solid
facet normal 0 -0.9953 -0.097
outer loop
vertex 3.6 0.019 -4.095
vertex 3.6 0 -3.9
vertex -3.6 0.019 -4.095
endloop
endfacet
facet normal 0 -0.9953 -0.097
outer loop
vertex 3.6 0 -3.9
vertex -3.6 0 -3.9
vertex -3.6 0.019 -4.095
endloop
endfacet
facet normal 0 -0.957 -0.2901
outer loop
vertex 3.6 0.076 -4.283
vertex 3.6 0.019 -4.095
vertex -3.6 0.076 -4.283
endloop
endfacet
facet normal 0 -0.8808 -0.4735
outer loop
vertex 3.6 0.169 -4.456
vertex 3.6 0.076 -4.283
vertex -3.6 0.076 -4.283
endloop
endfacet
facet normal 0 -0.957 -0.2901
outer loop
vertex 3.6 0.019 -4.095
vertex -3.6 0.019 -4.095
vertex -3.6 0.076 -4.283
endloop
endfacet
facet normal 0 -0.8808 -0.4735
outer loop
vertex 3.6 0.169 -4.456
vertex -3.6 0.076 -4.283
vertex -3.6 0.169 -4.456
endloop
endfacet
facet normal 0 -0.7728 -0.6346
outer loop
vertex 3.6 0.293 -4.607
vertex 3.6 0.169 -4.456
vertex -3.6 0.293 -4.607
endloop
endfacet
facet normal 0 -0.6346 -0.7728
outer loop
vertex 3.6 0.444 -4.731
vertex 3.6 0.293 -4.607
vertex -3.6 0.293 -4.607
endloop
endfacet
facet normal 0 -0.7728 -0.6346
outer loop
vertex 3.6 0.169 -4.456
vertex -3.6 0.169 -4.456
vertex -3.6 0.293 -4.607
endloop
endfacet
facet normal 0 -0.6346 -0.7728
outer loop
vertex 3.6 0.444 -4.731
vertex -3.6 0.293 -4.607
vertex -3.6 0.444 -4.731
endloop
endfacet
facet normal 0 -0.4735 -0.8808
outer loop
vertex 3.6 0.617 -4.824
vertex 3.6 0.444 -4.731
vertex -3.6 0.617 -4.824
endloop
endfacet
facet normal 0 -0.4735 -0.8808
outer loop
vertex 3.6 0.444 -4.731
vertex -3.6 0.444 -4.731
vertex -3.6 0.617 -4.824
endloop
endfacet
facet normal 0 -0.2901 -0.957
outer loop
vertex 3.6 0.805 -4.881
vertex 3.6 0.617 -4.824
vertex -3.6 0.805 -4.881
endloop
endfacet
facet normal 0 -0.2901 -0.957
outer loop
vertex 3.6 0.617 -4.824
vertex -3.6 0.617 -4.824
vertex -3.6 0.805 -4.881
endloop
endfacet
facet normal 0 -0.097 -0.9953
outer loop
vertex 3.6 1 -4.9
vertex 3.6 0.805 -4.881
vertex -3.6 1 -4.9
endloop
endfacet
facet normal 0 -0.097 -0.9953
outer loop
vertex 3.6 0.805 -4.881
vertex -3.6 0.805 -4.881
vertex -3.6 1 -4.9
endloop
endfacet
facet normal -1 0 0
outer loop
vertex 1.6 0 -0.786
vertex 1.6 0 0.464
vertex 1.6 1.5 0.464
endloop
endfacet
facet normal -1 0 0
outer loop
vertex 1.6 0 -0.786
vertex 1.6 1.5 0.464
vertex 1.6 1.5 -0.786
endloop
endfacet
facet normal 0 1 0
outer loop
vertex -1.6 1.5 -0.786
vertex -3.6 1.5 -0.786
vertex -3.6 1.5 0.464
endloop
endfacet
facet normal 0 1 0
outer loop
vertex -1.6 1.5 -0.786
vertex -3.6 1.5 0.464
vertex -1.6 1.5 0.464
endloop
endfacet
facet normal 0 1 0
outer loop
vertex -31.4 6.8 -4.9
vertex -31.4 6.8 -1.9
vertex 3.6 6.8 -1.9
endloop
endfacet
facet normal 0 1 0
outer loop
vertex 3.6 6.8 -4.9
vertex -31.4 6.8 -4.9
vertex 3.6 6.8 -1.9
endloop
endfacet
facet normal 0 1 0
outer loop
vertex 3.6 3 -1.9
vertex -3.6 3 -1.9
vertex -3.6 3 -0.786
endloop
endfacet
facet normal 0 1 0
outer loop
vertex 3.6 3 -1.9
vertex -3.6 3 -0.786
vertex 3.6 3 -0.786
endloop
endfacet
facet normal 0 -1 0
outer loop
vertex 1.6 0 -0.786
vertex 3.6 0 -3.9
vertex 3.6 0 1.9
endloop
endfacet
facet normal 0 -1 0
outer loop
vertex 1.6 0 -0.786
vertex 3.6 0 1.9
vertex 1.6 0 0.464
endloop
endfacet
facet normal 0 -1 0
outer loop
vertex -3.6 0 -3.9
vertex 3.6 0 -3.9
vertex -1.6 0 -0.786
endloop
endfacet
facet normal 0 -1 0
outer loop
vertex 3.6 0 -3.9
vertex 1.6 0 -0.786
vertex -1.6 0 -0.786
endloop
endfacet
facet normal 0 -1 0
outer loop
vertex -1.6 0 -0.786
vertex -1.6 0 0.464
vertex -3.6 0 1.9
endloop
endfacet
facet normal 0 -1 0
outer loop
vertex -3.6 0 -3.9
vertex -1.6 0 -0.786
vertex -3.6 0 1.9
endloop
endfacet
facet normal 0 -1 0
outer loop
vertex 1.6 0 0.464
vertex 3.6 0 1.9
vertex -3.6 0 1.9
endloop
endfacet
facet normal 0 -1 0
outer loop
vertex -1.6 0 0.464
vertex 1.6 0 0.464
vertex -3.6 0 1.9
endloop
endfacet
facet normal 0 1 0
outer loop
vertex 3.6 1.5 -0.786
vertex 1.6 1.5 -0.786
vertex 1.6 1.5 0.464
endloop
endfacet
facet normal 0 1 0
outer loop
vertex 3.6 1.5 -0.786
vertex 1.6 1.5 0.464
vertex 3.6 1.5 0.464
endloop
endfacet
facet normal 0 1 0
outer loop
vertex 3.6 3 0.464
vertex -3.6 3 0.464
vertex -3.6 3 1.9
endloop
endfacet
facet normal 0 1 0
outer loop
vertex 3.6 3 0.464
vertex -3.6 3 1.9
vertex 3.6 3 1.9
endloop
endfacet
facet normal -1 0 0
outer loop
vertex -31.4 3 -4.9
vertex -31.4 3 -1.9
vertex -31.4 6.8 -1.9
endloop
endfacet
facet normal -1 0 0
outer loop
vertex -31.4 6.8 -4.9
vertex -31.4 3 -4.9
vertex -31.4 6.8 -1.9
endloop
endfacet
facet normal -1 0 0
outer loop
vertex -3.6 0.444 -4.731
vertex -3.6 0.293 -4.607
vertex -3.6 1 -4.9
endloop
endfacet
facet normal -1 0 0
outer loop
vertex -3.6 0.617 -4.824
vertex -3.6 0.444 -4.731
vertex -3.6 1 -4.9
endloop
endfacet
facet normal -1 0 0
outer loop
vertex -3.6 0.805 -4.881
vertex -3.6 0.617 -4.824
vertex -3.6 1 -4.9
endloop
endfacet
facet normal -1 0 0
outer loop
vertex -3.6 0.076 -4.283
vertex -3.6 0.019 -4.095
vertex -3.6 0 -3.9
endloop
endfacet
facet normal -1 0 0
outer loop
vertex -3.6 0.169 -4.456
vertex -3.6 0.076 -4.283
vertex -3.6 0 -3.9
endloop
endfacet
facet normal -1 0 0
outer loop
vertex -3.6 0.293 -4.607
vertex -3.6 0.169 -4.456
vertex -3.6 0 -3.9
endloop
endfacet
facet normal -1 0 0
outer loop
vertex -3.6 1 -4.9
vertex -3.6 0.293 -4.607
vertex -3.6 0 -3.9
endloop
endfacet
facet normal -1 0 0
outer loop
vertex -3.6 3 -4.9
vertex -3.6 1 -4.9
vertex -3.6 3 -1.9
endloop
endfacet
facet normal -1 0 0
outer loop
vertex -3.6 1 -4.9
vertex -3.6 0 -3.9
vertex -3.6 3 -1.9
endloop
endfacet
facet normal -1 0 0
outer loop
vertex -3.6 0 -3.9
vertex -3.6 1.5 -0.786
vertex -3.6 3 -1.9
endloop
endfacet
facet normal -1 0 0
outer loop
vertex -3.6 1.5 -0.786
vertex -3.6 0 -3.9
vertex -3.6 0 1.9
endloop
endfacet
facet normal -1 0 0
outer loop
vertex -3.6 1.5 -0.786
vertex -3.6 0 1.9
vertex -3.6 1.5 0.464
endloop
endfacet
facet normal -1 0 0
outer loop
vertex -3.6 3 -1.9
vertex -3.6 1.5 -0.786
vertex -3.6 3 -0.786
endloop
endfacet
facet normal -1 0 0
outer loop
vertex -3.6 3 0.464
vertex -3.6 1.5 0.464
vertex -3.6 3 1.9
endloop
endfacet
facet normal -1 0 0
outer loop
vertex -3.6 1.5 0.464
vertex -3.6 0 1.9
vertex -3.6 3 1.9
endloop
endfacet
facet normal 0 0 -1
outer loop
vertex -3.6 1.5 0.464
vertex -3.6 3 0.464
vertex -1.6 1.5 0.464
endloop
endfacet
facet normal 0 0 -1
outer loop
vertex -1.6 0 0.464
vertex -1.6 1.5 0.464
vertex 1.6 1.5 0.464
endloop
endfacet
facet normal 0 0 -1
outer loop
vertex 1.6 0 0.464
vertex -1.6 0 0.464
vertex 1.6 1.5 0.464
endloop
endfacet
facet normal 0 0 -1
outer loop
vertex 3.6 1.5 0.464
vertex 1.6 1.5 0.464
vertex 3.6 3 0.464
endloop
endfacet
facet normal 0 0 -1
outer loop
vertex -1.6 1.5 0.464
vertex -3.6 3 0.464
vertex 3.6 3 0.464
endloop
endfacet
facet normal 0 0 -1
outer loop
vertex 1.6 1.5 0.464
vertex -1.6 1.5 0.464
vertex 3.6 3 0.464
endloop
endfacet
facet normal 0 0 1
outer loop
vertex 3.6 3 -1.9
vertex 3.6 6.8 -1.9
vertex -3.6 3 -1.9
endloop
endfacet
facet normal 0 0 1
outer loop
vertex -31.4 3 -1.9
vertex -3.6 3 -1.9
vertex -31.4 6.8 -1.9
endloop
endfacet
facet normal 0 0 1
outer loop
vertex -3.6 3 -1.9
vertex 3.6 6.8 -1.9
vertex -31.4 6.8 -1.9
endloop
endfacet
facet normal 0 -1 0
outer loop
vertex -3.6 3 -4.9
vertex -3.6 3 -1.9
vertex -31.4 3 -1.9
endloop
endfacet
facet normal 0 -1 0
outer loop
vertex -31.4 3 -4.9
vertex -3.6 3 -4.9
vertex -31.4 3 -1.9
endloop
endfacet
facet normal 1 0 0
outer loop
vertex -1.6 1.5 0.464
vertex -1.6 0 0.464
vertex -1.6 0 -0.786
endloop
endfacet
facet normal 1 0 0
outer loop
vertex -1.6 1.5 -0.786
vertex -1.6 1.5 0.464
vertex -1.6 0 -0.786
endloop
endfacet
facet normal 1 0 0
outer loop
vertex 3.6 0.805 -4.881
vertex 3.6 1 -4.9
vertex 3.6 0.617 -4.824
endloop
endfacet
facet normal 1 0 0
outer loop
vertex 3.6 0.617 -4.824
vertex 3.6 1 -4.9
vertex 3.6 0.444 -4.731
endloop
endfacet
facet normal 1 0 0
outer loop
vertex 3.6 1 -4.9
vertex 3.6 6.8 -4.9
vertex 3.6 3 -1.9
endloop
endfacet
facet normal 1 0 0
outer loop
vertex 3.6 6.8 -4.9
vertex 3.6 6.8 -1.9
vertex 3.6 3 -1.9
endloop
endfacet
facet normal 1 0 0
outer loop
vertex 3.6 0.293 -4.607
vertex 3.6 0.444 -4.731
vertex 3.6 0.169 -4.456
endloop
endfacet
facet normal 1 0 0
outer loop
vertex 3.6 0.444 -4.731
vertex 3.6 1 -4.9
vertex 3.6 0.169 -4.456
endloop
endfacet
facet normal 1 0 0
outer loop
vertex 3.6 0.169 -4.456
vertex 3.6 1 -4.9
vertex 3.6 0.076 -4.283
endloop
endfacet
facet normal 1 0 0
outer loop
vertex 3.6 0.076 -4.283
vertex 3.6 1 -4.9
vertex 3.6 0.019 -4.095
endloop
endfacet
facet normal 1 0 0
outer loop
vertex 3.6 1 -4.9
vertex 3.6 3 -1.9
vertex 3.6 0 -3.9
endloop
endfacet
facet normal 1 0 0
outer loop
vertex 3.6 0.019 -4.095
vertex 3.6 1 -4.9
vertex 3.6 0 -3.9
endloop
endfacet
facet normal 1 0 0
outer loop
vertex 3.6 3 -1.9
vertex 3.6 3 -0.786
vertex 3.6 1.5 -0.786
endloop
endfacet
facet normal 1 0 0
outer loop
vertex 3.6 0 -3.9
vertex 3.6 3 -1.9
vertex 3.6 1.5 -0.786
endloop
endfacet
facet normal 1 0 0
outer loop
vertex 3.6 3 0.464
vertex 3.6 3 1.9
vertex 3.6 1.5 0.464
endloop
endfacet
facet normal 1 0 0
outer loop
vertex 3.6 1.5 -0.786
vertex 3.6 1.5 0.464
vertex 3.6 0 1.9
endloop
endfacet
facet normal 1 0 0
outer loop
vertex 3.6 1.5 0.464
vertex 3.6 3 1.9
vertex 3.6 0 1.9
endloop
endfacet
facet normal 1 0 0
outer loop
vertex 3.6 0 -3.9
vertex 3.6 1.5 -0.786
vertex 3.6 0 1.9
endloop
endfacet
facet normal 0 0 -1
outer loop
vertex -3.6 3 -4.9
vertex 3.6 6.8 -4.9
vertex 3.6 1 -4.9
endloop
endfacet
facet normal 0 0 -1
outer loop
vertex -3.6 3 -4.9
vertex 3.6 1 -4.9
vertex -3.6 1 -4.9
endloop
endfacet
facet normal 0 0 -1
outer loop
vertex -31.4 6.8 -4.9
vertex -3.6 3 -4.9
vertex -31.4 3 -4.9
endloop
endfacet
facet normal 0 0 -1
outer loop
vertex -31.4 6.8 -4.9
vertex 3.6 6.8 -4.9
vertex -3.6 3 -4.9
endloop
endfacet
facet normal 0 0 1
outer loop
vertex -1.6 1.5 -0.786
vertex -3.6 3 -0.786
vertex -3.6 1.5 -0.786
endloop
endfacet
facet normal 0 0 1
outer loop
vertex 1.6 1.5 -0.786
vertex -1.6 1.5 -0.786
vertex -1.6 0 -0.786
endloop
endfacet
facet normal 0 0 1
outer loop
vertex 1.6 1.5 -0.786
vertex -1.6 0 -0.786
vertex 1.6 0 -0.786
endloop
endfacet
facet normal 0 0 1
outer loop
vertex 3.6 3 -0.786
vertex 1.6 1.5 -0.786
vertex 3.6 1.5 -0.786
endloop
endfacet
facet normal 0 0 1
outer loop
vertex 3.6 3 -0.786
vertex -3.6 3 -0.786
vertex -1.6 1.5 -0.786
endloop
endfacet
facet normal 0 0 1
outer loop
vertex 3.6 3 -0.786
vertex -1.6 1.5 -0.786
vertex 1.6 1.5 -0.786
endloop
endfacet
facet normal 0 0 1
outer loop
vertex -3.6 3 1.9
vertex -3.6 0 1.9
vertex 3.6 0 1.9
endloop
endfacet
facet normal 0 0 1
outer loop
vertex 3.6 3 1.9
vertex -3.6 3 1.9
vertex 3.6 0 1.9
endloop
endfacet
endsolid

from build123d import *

# Parameters (mm, degrees)
SKETCH1_W           = 7.2
SKETCH1_H           = 3.8
SKETCH1_W_2         = 3.2
SKETCH1_H_2         = 1.25
BOSS_EXTRUDE1_DEPTH = 3
SKETCH6_W           = 13
SKETCH6_H           = 1.25
CUT_EXTRUDE2_DEPTH  = 1.5
BOSS_EXTRUDE2_DEPTH = 3
FILLET1_R           = 1


with BuildPart() as part:
    # Sketch1 → Boss-Extrude1 (new body)
    with BuildSketch(Plane(origin=(0, 0, 0), x_dir=(1, 0, 0), z_dir=(0, 1, 0))):
        Rectangle(SKETCH1_W, SKETCH1_H)
        with Locations((0, 0.16055458)):
            Rectangle(SKETCH1_W_2, SKETCH1_H_2, mode=Mode.SUBTRACT)
    extrude(amount=BOSS_EXTRUDE1_DEPTH)

    # Sketch6 → Cut-Extrude2 (cut)
    with BuildSketch(Plane(origin=(0, 3, 0), x_dir=(1, 0, 0), z_dir=(0, 1, 0))):
        with Locations((1, 0.16055458)):
            Rectangle(SKETCH6_W, SKETCH6_H)
    extrude(amount=-CUT_EXTRUDE2_DEPTH, mode=Mode.SUBTRACT)

    # Sketch7 → Boss-Extrude2 (add)
    with BuildSketch(Plane(origin=(0, 0, -1.9), x_dir=(-1, 0, 0), z_dir=(0, 0, -1))):
        Polygon((-3.6, 0), (3.6, 0), (3.6, 3), (31.4, 3), (31.4, 6.8), (-3.6, 6.8), align=None)
    extrude(amount=BOSS_EXTRUDE2_DEPTH)

    # Fillet1
    fillet1_edges = [part.edges().sort_by_distance(p)[0] for p in [
        (0, 0, -4.9),
    ]]
    fillet(fillet1_edges, radius=FILLET1_R)


solid = part.part
